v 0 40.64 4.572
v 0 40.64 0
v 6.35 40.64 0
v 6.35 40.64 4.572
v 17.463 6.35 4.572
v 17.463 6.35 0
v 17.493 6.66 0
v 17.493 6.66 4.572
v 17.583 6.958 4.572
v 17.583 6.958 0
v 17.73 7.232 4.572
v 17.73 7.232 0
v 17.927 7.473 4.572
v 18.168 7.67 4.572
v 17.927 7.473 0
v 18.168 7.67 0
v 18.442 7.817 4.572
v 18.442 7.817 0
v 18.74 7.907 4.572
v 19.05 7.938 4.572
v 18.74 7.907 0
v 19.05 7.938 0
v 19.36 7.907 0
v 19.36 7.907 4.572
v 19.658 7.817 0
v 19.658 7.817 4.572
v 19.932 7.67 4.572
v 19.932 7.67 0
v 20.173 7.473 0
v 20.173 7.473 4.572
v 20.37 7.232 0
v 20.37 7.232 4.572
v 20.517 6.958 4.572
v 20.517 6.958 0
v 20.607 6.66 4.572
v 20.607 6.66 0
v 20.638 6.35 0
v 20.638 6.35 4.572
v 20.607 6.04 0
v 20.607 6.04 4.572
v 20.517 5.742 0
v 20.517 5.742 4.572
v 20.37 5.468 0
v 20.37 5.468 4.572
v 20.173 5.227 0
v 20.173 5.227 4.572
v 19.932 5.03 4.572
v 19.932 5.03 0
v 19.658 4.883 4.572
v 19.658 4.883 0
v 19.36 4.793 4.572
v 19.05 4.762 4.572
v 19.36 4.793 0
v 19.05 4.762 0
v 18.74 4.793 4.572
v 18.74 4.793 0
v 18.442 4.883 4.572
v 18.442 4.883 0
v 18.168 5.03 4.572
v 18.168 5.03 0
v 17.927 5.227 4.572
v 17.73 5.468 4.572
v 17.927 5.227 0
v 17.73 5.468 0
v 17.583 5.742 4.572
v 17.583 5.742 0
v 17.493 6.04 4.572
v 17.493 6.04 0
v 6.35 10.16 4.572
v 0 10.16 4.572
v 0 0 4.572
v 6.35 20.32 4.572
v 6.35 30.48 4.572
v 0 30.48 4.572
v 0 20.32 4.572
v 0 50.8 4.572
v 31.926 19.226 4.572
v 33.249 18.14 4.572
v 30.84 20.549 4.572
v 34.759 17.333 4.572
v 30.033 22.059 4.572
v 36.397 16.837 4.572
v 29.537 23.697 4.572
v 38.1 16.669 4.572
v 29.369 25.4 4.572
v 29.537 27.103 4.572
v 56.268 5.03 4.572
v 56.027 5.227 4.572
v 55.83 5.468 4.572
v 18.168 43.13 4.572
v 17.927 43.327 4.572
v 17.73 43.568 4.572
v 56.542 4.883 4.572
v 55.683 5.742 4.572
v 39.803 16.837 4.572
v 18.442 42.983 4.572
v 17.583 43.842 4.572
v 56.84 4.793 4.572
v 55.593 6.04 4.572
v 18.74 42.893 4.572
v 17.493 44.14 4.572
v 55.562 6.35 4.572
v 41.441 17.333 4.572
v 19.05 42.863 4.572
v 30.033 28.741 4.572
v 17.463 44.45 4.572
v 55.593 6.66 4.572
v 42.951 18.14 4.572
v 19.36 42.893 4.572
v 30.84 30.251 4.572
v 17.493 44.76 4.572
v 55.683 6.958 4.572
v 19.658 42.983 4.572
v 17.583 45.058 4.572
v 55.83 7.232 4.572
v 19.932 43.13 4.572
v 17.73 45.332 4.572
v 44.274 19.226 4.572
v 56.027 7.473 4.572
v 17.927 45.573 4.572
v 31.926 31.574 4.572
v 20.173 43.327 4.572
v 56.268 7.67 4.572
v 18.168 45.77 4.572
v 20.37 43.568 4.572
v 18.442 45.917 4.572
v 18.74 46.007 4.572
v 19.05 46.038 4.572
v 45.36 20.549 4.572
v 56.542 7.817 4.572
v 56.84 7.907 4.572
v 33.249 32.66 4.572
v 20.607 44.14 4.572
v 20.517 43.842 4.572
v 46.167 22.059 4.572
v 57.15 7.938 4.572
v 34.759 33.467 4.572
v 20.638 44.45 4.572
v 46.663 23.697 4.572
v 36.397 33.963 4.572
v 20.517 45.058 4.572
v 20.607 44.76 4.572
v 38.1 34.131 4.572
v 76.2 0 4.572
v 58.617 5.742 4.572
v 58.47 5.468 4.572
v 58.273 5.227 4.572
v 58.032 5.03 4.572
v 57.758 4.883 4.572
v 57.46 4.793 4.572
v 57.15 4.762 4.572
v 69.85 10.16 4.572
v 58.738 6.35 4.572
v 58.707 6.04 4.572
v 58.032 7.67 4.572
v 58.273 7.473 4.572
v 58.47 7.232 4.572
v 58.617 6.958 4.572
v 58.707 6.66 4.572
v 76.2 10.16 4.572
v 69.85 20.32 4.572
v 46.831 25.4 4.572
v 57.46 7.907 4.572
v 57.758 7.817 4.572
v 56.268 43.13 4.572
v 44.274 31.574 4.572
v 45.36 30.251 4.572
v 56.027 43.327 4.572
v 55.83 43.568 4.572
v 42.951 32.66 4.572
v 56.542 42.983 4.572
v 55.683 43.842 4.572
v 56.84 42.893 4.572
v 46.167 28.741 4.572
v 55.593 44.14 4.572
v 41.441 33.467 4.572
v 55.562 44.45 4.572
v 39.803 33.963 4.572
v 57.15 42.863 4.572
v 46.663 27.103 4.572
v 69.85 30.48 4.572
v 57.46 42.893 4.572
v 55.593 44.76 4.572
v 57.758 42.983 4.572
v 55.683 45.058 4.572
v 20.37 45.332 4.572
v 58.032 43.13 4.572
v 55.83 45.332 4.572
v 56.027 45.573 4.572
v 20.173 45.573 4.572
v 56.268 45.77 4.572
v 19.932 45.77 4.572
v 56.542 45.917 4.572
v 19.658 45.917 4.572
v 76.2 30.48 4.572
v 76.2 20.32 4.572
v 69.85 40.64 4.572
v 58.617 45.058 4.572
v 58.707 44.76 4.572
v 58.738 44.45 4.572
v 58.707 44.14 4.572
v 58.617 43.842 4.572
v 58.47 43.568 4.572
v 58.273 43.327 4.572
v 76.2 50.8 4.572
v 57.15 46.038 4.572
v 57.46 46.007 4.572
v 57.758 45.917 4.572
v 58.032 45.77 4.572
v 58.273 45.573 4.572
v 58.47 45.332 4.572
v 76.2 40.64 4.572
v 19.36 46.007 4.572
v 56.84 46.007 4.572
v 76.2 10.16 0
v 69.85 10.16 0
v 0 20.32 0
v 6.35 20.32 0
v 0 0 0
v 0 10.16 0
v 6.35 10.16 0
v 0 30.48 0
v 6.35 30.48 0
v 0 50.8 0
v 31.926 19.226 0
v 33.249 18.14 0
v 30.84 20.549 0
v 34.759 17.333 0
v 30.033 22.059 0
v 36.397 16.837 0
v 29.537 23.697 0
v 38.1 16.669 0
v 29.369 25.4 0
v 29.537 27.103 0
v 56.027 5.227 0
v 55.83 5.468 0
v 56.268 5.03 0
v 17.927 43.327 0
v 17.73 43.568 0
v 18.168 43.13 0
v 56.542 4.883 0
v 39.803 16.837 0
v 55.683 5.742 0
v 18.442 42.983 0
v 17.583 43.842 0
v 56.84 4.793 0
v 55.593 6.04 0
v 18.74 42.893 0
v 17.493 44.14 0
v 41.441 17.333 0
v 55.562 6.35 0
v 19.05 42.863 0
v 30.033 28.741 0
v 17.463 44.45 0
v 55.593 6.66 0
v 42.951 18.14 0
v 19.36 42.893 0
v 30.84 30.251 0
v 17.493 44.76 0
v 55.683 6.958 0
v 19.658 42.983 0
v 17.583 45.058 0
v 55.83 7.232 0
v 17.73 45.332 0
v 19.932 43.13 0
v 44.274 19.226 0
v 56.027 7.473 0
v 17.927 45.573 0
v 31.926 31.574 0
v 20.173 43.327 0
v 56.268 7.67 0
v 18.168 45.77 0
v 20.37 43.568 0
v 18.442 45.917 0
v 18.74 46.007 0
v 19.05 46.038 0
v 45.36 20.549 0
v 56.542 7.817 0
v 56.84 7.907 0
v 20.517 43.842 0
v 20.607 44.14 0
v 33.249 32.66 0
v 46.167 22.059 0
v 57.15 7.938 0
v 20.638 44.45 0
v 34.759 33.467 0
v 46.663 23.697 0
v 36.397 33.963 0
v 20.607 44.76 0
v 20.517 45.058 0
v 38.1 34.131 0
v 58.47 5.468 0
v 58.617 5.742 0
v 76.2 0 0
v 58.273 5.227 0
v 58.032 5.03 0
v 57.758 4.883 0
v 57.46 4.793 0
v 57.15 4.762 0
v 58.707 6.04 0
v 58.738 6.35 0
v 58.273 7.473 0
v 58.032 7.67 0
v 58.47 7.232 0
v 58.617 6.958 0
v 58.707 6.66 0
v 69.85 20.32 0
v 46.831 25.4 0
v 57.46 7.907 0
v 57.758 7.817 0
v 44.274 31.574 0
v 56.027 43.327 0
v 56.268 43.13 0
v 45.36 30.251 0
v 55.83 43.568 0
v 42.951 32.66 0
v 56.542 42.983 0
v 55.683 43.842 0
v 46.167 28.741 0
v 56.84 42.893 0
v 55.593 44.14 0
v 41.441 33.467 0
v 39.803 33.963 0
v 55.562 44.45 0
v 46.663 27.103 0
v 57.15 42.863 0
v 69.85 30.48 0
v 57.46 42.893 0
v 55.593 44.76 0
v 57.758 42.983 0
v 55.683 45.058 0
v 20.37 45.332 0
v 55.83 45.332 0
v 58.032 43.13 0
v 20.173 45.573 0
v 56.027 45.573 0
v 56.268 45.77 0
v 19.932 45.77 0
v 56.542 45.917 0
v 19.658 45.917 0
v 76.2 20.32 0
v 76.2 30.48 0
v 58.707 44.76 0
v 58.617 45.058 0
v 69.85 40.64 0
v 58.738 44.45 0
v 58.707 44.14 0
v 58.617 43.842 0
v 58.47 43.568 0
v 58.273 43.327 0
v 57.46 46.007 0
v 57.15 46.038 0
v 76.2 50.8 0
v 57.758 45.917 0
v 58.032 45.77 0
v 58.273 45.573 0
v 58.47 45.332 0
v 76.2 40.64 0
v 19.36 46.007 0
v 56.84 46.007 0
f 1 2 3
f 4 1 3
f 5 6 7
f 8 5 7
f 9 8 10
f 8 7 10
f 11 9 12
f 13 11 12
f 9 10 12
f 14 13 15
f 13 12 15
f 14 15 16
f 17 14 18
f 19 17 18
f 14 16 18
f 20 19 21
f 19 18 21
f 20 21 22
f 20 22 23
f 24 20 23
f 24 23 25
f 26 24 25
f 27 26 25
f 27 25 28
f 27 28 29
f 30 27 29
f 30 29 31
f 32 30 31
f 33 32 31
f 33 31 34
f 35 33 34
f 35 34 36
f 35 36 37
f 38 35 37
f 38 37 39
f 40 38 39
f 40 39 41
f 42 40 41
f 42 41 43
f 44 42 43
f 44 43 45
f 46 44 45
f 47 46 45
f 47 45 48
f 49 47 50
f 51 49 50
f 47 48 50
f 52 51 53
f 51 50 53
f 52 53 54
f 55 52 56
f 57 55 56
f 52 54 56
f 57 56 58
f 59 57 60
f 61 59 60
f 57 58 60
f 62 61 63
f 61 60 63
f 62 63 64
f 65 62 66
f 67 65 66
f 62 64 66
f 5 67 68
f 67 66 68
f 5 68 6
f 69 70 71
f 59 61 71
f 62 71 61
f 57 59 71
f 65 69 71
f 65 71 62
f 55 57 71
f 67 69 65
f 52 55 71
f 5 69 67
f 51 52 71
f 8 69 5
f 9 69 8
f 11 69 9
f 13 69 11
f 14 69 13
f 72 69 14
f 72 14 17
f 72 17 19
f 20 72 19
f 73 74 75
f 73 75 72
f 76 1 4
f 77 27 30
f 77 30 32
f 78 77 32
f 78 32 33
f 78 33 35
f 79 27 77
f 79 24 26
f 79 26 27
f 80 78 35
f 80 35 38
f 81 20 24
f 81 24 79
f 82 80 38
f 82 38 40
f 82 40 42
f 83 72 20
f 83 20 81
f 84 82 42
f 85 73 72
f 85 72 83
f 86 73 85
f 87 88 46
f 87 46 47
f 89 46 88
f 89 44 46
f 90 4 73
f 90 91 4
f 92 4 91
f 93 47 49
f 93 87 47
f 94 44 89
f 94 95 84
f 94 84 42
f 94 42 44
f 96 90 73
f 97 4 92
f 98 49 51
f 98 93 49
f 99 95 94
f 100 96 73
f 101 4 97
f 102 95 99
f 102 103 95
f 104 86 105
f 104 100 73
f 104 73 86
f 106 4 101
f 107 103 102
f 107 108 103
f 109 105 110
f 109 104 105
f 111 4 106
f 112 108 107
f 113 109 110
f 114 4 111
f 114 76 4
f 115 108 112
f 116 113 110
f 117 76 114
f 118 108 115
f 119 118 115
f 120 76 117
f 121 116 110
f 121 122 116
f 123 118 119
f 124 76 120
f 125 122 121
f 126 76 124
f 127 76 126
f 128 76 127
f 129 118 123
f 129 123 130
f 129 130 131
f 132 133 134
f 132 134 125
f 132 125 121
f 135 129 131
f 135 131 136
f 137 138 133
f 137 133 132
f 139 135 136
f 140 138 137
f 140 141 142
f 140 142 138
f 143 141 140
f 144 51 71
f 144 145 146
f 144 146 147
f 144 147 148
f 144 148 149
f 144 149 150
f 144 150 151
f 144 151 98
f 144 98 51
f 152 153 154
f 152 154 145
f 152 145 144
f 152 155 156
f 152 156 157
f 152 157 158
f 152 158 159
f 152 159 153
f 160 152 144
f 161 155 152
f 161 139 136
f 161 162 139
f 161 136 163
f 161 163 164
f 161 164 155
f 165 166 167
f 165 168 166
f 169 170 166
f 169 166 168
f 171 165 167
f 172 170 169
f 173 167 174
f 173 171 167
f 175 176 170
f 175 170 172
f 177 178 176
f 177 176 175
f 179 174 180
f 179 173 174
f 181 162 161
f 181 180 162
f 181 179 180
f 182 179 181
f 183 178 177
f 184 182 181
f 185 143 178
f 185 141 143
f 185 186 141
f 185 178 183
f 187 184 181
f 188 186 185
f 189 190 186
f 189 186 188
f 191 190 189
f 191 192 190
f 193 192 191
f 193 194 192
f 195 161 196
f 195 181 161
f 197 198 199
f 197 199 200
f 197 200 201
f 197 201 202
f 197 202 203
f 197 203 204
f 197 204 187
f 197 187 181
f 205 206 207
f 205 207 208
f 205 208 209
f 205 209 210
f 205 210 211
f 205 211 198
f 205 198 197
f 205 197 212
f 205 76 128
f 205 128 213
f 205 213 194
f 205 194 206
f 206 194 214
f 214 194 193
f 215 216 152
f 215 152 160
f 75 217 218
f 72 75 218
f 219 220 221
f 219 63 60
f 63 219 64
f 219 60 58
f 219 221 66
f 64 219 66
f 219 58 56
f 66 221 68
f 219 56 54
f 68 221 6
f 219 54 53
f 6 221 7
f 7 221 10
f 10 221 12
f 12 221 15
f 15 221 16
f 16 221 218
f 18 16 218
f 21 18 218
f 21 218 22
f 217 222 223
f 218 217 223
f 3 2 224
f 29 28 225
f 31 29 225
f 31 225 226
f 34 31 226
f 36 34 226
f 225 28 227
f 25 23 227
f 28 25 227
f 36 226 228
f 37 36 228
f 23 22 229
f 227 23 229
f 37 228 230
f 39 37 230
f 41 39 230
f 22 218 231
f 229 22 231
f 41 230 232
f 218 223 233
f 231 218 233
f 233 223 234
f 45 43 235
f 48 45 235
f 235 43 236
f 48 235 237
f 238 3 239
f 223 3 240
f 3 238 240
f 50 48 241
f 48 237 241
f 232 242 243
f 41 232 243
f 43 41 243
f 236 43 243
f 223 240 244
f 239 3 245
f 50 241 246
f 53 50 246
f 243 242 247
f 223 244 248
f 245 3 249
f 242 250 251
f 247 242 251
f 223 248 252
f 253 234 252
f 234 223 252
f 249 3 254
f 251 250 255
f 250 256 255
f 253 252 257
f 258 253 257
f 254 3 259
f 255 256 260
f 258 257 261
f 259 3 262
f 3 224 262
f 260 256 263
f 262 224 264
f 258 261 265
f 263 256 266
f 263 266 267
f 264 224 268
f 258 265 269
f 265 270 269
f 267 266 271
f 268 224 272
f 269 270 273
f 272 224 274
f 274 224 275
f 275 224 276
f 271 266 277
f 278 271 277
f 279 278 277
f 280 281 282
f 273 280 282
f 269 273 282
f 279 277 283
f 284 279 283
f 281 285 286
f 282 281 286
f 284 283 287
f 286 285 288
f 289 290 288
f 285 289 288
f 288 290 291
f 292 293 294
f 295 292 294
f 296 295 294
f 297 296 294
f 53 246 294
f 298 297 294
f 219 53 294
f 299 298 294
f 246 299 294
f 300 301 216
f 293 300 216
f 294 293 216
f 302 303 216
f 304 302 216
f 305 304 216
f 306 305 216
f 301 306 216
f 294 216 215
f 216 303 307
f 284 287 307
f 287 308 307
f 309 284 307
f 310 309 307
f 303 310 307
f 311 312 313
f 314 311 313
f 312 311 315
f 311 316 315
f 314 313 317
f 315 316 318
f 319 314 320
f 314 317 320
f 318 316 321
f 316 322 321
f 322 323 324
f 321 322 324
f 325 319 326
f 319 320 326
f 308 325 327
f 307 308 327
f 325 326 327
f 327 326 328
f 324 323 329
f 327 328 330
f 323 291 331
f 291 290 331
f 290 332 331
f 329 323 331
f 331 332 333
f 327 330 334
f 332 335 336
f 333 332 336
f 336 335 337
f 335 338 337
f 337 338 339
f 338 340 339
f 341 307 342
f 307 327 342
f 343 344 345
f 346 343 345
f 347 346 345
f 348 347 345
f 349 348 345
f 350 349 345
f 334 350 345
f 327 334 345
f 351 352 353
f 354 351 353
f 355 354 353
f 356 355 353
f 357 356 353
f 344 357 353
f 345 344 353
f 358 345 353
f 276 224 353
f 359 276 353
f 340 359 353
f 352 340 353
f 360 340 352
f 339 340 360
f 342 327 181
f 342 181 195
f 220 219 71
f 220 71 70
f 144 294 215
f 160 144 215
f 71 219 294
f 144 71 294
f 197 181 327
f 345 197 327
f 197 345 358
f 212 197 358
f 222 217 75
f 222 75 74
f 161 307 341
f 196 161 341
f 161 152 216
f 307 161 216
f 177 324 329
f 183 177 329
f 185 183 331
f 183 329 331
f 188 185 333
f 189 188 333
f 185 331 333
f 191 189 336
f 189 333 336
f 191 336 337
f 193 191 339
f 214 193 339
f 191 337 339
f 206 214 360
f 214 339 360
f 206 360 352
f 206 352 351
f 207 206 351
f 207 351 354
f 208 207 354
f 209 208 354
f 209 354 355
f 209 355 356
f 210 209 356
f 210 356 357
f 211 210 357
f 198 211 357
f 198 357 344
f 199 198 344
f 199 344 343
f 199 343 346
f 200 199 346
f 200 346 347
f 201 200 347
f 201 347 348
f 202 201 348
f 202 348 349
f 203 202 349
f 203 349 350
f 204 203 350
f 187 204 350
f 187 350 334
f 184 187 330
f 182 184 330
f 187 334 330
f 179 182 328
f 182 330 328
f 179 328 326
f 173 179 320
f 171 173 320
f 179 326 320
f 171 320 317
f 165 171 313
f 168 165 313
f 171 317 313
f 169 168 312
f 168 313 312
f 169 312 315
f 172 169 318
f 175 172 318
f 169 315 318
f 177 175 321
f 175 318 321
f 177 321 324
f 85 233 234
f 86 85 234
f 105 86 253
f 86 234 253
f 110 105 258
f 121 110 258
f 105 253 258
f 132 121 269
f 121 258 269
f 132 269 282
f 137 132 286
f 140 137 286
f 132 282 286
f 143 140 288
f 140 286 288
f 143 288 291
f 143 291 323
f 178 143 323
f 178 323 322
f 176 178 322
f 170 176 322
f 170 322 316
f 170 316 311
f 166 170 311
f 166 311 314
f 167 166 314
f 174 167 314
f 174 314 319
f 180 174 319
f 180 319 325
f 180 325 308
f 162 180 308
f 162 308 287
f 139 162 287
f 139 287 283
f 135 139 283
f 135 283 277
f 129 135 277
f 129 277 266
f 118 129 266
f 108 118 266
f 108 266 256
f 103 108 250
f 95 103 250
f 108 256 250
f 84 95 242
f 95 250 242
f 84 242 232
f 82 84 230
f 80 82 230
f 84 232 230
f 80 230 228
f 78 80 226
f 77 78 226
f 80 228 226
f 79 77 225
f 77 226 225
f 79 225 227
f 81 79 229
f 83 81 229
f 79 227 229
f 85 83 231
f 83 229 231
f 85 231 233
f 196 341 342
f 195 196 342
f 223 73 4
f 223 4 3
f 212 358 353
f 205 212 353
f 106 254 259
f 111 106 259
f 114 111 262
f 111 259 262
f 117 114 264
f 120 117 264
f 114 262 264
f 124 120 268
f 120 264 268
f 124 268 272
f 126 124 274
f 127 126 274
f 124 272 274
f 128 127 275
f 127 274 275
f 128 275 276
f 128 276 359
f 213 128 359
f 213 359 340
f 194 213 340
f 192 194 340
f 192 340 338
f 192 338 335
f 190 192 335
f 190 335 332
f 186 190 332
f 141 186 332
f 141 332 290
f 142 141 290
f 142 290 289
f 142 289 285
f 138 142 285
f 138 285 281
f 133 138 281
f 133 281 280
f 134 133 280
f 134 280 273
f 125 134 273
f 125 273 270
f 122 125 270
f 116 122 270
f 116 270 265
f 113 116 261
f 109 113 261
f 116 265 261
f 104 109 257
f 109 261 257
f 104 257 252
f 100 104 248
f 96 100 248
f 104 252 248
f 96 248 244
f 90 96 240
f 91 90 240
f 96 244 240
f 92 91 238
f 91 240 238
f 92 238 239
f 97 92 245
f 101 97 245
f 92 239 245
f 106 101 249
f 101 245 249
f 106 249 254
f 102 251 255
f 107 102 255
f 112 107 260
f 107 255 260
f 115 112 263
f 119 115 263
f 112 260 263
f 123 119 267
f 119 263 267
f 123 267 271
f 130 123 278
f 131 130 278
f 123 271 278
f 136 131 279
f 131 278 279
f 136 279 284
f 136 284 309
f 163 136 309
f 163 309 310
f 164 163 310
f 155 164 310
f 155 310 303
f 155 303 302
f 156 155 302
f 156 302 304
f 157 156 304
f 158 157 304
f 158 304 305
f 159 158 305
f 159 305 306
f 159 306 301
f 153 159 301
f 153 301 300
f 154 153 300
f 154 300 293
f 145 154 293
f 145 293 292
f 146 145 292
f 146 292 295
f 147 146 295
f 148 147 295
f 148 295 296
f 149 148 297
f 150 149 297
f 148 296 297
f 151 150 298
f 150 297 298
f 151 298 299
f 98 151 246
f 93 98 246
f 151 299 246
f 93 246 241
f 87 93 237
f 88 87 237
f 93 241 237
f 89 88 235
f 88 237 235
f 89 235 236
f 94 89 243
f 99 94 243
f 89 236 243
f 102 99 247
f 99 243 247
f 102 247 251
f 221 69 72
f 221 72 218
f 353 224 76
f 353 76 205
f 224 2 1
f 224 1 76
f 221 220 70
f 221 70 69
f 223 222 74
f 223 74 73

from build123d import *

# Parameters (mm, degrees)
SKETCH1_W           = 76.2
SKETCH1_H           = 50.8
BOSS_EXTRUDE1_DEPTH = 4.572
SKETCH2_R           = 8.73125
CUT_EXTRUDE7_DEPTH  = 92.695055396
SKETCH5_R           = 1.5875
CUT_EXTRUDE8_DEPTH  = 92.695055396
CAVITY1_START       = 10.16
CAVITY1_OUTLINE_W   = 6.35
CAVITY1_OUTLINE_H   = 4.572
CAVITY1_DEPTH       = 10.16
CAVITY1_START_2     = 30.48
CAVITY1_2_OUTLINE_W = 6.35
CAVITY1_2_OUTLINE_H = 4.572
CAVITY1_2_DEPTH     = 10.16


# Read off the part's stored shape, not the designer's step: Cavity1
with BuildPart() as part:
    # Sketch1 → Boss-Extrude1 (new body)
    with BuildSketch(Plane.XY):
        with Locations((38.1, 25.4)):
            Rectangle(SKETCH1_W, SKETCH1_H)
    extrude(amount=BOSS_EXTRUDE1_DEPTH)

    # Sketch2 → Cut-Extrude7 (cut, through all)
    with BuildSketch(Plane(origin=(0, 0, 0), x_dir=(-1, 0, 0), z_dir=(0, 0, -1))):
        with Locations((-38.1, 25.4)):
            Circle(SKETCH2_R)
    extrude(amount=-CUT_EXTRUDE7_DEPTH, mode=Mode.SUBTRACT)

    # Sketch5 → Cut-Extrude8 (cut, through all)
    with BuildSketch(Plane(origin=(0, 0, 0), x_dir=(-1, 0, 0), z_dir=(0, 0, -1))):
        with Locations((-19.05, 44.45)):
            Circle(SKETCH5_R)
        with Locations((-19.05, 6.35)):
            Circle(SKETCH5_R)
        with Locations((-57.15, 44.45)):
            Circle(SKETCH5_R)
        with Locations((-57.15, 6.35)):
            Circle(SKETCH5_R)
    extrude(amount=-CUT_EXTRUDE8_DEPTH, mode=Mode.SUBTRACT)

    # Cavity1 outline → Cavity1 (cut)
    with BuildSketch(Plane(origin=(0, 0, 0), x_dir=(1, 0, 0), z_dir=(0, 1, 0)).offset(CAVITY1_START)):
        with Locations((3.175, -2.286)):
            Rectangle(CAVITY1_OUTLINE_W, CAVITY1_OUTLINE_H)
        with Locations((73.025, -2.286)):
            Rectangle(CAVITY1_OUTLINE_W, CAVITY1_OUTLINE_H)
    extrude(amount=CAVITY1_DEPTH, mode=Mode.SUBTRACT)

    # Cavity1 2 outline → Cavity1 2 (cut)
    with BuildSketch(Plane(origin=(0, 0, 0), x_dir=(1, 0, 0), z_dir=(0, 1, 0)).offset(CAVITY1_START_2)):
        with Locations((3.175, -2.286)):
            Rectangle(CAVITY1_2_OUTLINE_W, CAVITY1_2_OUTLINE_H)
        with Locations((73.025, -2.286)):
            Rectangle(CAVITY1_2_OUTLINE_W, CAVITY1_2_OUTLINE_H)
    extrude(amount=CAVITY1_2_DEPTH, mode=Mode.SUBTRACT)


solid = part.part
